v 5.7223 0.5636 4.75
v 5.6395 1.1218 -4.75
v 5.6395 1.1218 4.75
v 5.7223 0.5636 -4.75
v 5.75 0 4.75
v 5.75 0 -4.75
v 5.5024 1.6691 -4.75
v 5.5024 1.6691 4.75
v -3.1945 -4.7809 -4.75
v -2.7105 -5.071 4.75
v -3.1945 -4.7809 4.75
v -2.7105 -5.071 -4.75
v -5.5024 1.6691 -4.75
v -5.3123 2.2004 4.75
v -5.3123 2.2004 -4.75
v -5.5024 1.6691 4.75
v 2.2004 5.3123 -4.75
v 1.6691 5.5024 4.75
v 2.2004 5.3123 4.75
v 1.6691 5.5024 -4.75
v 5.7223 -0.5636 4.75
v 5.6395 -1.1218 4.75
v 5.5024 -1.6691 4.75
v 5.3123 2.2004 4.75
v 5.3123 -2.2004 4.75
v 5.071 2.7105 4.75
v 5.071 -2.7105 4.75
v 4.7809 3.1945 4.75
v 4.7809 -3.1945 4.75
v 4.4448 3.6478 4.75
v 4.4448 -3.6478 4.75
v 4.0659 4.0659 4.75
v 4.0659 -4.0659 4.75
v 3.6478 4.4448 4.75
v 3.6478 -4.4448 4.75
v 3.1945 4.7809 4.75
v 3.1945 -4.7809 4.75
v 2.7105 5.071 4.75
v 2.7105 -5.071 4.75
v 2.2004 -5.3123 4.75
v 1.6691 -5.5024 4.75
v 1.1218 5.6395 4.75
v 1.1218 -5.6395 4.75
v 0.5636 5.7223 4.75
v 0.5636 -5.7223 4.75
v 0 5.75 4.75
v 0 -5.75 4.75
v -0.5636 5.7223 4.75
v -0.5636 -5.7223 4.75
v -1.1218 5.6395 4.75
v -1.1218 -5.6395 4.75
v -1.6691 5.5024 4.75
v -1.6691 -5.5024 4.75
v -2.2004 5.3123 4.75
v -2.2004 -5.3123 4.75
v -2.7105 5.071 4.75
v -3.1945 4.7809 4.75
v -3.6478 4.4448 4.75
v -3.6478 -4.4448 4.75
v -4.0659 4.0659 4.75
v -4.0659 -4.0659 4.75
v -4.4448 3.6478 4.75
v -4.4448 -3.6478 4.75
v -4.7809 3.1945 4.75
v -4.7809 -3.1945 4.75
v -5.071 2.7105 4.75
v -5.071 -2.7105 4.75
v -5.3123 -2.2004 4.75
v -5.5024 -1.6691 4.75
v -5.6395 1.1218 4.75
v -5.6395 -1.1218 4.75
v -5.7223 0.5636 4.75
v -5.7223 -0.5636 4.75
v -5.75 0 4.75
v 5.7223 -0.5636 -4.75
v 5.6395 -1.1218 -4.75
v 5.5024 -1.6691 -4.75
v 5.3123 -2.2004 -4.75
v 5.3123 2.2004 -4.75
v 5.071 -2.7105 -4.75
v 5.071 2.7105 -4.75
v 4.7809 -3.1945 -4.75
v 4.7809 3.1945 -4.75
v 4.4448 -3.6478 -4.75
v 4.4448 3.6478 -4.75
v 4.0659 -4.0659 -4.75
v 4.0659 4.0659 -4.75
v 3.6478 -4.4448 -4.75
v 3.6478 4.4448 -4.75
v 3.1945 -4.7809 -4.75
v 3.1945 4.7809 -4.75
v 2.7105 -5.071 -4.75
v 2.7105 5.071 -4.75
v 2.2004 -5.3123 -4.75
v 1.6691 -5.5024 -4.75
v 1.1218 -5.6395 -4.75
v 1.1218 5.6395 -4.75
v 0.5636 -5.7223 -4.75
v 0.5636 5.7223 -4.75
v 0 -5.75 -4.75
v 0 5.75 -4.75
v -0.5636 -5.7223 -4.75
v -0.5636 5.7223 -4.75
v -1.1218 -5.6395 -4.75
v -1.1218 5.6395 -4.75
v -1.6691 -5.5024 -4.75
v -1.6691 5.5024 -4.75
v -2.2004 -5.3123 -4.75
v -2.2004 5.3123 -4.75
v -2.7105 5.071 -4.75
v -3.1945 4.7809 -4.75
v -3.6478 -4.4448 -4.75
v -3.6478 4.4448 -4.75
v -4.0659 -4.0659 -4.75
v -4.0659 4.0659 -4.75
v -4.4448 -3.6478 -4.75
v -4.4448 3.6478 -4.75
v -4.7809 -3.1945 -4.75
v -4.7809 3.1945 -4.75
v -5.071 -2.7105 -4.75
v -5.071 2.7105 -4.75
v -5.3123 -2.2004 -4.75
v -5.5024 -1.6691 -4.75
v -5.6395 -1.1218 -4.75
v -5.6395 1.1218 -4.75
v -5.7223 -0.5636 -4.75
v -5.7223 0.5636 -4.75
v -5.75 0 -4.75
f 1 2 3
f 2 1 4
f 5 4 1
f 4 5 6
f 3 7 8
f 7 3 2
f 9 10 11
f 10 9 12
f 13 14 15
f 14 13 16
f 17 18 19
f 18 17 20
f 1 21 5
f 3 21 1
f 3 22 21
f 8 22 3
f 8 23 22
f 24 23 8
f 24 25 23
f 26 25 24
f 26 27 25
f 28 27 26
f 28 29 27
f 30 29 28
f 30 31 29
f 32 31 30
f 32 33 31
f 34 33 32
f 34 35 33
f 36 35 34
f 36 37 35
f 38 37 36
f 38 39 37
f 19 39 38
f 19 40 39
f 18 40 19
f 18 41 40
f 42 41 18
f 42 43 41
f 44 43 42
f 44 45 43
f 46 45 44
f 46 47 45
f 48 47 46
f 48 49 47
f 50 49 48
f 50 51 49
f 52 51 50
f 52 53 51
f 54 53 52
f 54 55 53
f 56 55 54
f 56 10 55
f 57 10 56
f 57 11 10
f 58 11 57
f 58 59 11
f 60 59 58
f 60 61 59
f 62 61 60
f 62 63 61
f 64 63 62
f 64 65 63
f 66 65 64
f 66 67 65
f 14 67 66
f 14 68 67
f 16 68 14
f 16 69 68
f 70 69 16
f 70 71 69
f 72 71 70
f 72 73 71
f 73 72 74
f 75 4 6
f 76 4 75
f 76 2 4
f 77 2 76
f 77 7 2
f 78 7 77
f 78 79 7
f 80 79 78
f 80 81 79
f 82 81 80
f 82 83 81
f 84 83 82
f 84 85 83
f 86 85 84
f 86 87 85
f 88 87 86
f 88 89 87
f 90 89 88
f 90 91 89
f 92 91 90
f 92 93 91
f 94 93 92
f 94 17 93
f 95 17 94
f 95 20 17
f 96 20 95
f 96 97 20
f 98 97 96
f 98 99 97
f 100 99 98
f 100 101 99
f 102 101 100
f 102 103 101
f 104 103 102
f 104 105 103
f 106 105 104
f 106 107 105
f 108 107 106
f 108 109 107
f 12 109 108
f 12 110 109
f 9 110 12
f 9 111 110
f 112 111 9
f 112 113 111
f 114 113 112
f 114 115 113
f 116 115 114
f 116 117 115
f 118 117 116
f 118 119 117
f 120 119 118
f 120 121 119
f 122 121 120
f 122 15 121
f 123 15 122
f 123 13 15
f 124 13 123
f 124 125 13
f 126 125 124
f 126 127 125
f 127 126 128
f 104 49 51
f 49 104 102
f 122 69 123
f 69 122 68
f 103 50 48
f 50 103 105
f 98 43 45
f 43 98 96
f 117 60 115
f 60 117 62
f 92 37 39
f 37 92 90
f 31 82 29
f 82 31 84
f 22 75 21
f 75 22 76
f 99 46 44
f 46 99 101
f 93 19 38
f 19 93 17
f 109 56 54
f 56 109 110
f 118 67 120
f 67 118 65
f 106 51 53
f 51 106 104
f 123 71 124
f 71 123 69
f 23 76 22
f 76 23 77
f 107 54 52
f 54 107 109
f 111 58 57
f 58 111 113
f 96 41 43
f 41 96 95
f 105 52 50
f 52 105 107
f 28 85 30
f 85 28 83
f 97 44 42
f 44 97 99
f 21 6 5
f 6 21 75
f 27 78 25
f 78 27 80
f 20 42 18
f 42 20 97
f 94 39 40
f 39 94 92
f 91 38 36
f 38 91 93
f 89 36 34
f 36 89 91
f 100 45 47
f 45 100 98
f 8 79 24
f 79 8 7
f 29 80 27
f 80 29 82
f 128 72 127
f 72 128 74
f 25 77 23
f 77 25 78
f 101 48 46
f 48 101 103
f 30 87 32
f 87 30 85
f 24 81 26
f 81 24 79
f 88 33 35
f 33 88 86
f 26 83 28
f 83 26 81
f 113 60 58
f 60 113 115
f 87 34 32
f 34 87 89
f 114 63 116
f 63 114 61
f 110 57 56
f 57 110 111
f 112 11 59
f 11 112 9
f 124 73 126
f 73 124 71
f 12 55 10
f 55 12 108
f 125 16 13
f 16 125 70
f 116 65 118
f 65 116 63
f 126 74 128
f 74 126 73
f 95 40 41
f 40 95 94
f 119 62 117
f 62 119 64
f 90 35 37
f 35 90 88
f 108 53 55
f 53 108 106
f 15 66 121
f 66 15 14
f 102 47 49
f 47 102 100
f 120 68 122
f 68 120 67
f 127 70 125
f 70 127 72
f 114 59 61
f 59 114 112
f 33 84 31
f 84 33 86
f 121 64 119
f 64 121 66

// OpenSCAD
module brushless_dc_motor() {
    // Stator
    translate([0, 0, -9.5/2])
        cylinder(h=9.5, d=11.5, $fn=64);
    
    // Rotor
    translate([0, 0, -9.5/2])
        difference() {
            cylinder(h=9.5, d=11.5, $fn=64);
            translate([0, 0, -9.5/2])
                cylinder(h=9.5, d=9.5, $fn=64);
        }
}

brushless_dc_motor();
